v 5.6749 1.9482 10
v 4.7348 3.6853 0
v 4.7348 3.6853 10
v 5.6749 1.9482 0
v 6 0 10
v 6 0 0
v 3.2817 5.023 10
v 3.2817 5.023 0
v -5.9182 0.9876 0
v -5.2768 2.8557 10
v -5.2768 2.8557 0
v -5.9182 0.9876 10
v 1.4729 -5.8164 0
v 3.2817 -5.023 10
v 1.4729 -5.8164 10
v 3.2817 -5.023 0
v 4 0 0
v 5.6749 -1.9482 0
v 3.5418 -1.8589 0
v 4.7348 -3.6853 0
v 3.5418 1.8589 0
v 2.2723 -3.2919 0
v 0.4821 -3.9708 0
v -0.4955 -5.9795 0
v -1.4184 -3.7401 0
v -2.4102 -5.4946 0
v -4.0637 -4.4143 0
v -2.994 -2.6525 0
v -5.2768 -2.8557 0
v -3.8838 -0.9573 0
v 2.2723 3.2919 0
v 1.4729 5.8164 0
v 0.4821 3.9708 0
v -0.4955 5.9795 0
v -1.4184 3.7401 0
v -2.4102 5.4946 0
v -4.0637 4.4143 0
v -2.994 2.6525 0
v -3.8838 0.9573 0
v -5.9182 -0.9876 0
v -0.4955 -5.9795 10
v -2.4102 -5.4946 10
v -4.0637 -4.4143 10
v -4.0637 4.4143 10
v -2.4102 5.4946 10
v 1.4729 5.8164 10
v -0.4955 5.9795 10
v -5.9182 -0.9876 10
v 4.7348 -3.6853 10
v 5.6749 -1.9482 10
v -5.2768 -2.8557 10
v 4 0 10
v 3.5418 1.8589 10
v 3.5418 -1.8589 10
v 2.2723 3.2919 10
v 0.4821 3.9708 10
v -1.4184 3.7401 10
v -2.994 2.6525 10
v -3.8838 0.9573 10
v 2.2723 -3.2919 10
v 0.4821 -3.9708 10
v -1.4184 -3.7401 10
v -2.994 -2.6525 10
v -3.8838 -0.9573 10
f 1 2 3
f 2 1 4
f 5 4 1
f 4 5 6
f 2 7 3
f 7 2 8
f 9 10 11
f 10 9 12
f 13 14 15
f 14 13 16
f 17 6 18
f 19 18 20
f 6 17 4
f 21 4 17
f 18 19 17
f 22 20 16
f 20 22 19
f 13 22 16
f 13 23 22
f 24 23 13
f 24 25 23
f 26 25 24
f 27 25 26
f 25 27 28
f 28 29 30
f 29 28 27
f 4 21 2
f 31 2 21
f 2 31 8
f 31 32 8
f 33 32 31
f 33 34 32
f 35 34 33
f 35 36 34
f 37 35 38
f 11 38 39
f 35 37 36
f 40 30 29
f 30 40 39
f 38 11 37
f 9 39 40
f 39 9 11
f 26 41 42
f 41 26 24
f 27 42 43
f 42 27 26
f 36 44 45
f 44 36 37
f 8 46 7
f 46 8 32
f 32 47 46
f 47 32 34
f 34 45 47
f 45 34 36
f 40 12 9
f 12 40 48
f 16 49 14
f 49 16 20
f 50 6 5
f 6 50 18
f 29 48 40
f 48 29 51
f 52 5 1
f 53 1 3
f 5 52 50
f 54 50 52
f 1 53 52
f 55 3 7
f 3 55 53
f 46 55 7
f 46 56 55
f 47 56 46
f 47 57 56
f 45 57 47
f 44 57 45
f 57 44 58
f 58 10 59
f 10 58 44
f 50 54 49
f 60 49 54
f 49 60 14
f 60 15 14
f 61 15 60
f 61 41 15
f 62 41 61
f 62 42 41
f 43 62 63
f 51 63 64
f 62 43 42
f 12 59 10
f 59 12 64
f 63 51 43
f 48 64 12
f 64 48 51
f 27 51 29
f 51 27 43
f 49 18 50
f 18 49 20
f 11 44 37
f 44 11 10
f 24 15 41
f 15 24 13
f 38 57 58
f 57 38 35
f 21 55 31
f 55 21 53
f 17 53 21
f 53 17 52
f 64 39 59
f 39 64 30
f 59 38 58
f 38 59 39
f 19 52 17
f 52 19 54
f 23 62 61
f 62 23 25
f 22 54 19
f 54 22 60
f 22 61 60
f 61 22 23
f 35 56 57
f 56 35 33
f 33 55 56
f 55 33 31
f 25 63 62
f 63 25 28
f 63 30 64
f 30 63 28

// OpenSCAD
union() {
	difference() {
		cylinder(h = 10, r = 6);
		cylinder(h = 10, r = 4);
	}
}
